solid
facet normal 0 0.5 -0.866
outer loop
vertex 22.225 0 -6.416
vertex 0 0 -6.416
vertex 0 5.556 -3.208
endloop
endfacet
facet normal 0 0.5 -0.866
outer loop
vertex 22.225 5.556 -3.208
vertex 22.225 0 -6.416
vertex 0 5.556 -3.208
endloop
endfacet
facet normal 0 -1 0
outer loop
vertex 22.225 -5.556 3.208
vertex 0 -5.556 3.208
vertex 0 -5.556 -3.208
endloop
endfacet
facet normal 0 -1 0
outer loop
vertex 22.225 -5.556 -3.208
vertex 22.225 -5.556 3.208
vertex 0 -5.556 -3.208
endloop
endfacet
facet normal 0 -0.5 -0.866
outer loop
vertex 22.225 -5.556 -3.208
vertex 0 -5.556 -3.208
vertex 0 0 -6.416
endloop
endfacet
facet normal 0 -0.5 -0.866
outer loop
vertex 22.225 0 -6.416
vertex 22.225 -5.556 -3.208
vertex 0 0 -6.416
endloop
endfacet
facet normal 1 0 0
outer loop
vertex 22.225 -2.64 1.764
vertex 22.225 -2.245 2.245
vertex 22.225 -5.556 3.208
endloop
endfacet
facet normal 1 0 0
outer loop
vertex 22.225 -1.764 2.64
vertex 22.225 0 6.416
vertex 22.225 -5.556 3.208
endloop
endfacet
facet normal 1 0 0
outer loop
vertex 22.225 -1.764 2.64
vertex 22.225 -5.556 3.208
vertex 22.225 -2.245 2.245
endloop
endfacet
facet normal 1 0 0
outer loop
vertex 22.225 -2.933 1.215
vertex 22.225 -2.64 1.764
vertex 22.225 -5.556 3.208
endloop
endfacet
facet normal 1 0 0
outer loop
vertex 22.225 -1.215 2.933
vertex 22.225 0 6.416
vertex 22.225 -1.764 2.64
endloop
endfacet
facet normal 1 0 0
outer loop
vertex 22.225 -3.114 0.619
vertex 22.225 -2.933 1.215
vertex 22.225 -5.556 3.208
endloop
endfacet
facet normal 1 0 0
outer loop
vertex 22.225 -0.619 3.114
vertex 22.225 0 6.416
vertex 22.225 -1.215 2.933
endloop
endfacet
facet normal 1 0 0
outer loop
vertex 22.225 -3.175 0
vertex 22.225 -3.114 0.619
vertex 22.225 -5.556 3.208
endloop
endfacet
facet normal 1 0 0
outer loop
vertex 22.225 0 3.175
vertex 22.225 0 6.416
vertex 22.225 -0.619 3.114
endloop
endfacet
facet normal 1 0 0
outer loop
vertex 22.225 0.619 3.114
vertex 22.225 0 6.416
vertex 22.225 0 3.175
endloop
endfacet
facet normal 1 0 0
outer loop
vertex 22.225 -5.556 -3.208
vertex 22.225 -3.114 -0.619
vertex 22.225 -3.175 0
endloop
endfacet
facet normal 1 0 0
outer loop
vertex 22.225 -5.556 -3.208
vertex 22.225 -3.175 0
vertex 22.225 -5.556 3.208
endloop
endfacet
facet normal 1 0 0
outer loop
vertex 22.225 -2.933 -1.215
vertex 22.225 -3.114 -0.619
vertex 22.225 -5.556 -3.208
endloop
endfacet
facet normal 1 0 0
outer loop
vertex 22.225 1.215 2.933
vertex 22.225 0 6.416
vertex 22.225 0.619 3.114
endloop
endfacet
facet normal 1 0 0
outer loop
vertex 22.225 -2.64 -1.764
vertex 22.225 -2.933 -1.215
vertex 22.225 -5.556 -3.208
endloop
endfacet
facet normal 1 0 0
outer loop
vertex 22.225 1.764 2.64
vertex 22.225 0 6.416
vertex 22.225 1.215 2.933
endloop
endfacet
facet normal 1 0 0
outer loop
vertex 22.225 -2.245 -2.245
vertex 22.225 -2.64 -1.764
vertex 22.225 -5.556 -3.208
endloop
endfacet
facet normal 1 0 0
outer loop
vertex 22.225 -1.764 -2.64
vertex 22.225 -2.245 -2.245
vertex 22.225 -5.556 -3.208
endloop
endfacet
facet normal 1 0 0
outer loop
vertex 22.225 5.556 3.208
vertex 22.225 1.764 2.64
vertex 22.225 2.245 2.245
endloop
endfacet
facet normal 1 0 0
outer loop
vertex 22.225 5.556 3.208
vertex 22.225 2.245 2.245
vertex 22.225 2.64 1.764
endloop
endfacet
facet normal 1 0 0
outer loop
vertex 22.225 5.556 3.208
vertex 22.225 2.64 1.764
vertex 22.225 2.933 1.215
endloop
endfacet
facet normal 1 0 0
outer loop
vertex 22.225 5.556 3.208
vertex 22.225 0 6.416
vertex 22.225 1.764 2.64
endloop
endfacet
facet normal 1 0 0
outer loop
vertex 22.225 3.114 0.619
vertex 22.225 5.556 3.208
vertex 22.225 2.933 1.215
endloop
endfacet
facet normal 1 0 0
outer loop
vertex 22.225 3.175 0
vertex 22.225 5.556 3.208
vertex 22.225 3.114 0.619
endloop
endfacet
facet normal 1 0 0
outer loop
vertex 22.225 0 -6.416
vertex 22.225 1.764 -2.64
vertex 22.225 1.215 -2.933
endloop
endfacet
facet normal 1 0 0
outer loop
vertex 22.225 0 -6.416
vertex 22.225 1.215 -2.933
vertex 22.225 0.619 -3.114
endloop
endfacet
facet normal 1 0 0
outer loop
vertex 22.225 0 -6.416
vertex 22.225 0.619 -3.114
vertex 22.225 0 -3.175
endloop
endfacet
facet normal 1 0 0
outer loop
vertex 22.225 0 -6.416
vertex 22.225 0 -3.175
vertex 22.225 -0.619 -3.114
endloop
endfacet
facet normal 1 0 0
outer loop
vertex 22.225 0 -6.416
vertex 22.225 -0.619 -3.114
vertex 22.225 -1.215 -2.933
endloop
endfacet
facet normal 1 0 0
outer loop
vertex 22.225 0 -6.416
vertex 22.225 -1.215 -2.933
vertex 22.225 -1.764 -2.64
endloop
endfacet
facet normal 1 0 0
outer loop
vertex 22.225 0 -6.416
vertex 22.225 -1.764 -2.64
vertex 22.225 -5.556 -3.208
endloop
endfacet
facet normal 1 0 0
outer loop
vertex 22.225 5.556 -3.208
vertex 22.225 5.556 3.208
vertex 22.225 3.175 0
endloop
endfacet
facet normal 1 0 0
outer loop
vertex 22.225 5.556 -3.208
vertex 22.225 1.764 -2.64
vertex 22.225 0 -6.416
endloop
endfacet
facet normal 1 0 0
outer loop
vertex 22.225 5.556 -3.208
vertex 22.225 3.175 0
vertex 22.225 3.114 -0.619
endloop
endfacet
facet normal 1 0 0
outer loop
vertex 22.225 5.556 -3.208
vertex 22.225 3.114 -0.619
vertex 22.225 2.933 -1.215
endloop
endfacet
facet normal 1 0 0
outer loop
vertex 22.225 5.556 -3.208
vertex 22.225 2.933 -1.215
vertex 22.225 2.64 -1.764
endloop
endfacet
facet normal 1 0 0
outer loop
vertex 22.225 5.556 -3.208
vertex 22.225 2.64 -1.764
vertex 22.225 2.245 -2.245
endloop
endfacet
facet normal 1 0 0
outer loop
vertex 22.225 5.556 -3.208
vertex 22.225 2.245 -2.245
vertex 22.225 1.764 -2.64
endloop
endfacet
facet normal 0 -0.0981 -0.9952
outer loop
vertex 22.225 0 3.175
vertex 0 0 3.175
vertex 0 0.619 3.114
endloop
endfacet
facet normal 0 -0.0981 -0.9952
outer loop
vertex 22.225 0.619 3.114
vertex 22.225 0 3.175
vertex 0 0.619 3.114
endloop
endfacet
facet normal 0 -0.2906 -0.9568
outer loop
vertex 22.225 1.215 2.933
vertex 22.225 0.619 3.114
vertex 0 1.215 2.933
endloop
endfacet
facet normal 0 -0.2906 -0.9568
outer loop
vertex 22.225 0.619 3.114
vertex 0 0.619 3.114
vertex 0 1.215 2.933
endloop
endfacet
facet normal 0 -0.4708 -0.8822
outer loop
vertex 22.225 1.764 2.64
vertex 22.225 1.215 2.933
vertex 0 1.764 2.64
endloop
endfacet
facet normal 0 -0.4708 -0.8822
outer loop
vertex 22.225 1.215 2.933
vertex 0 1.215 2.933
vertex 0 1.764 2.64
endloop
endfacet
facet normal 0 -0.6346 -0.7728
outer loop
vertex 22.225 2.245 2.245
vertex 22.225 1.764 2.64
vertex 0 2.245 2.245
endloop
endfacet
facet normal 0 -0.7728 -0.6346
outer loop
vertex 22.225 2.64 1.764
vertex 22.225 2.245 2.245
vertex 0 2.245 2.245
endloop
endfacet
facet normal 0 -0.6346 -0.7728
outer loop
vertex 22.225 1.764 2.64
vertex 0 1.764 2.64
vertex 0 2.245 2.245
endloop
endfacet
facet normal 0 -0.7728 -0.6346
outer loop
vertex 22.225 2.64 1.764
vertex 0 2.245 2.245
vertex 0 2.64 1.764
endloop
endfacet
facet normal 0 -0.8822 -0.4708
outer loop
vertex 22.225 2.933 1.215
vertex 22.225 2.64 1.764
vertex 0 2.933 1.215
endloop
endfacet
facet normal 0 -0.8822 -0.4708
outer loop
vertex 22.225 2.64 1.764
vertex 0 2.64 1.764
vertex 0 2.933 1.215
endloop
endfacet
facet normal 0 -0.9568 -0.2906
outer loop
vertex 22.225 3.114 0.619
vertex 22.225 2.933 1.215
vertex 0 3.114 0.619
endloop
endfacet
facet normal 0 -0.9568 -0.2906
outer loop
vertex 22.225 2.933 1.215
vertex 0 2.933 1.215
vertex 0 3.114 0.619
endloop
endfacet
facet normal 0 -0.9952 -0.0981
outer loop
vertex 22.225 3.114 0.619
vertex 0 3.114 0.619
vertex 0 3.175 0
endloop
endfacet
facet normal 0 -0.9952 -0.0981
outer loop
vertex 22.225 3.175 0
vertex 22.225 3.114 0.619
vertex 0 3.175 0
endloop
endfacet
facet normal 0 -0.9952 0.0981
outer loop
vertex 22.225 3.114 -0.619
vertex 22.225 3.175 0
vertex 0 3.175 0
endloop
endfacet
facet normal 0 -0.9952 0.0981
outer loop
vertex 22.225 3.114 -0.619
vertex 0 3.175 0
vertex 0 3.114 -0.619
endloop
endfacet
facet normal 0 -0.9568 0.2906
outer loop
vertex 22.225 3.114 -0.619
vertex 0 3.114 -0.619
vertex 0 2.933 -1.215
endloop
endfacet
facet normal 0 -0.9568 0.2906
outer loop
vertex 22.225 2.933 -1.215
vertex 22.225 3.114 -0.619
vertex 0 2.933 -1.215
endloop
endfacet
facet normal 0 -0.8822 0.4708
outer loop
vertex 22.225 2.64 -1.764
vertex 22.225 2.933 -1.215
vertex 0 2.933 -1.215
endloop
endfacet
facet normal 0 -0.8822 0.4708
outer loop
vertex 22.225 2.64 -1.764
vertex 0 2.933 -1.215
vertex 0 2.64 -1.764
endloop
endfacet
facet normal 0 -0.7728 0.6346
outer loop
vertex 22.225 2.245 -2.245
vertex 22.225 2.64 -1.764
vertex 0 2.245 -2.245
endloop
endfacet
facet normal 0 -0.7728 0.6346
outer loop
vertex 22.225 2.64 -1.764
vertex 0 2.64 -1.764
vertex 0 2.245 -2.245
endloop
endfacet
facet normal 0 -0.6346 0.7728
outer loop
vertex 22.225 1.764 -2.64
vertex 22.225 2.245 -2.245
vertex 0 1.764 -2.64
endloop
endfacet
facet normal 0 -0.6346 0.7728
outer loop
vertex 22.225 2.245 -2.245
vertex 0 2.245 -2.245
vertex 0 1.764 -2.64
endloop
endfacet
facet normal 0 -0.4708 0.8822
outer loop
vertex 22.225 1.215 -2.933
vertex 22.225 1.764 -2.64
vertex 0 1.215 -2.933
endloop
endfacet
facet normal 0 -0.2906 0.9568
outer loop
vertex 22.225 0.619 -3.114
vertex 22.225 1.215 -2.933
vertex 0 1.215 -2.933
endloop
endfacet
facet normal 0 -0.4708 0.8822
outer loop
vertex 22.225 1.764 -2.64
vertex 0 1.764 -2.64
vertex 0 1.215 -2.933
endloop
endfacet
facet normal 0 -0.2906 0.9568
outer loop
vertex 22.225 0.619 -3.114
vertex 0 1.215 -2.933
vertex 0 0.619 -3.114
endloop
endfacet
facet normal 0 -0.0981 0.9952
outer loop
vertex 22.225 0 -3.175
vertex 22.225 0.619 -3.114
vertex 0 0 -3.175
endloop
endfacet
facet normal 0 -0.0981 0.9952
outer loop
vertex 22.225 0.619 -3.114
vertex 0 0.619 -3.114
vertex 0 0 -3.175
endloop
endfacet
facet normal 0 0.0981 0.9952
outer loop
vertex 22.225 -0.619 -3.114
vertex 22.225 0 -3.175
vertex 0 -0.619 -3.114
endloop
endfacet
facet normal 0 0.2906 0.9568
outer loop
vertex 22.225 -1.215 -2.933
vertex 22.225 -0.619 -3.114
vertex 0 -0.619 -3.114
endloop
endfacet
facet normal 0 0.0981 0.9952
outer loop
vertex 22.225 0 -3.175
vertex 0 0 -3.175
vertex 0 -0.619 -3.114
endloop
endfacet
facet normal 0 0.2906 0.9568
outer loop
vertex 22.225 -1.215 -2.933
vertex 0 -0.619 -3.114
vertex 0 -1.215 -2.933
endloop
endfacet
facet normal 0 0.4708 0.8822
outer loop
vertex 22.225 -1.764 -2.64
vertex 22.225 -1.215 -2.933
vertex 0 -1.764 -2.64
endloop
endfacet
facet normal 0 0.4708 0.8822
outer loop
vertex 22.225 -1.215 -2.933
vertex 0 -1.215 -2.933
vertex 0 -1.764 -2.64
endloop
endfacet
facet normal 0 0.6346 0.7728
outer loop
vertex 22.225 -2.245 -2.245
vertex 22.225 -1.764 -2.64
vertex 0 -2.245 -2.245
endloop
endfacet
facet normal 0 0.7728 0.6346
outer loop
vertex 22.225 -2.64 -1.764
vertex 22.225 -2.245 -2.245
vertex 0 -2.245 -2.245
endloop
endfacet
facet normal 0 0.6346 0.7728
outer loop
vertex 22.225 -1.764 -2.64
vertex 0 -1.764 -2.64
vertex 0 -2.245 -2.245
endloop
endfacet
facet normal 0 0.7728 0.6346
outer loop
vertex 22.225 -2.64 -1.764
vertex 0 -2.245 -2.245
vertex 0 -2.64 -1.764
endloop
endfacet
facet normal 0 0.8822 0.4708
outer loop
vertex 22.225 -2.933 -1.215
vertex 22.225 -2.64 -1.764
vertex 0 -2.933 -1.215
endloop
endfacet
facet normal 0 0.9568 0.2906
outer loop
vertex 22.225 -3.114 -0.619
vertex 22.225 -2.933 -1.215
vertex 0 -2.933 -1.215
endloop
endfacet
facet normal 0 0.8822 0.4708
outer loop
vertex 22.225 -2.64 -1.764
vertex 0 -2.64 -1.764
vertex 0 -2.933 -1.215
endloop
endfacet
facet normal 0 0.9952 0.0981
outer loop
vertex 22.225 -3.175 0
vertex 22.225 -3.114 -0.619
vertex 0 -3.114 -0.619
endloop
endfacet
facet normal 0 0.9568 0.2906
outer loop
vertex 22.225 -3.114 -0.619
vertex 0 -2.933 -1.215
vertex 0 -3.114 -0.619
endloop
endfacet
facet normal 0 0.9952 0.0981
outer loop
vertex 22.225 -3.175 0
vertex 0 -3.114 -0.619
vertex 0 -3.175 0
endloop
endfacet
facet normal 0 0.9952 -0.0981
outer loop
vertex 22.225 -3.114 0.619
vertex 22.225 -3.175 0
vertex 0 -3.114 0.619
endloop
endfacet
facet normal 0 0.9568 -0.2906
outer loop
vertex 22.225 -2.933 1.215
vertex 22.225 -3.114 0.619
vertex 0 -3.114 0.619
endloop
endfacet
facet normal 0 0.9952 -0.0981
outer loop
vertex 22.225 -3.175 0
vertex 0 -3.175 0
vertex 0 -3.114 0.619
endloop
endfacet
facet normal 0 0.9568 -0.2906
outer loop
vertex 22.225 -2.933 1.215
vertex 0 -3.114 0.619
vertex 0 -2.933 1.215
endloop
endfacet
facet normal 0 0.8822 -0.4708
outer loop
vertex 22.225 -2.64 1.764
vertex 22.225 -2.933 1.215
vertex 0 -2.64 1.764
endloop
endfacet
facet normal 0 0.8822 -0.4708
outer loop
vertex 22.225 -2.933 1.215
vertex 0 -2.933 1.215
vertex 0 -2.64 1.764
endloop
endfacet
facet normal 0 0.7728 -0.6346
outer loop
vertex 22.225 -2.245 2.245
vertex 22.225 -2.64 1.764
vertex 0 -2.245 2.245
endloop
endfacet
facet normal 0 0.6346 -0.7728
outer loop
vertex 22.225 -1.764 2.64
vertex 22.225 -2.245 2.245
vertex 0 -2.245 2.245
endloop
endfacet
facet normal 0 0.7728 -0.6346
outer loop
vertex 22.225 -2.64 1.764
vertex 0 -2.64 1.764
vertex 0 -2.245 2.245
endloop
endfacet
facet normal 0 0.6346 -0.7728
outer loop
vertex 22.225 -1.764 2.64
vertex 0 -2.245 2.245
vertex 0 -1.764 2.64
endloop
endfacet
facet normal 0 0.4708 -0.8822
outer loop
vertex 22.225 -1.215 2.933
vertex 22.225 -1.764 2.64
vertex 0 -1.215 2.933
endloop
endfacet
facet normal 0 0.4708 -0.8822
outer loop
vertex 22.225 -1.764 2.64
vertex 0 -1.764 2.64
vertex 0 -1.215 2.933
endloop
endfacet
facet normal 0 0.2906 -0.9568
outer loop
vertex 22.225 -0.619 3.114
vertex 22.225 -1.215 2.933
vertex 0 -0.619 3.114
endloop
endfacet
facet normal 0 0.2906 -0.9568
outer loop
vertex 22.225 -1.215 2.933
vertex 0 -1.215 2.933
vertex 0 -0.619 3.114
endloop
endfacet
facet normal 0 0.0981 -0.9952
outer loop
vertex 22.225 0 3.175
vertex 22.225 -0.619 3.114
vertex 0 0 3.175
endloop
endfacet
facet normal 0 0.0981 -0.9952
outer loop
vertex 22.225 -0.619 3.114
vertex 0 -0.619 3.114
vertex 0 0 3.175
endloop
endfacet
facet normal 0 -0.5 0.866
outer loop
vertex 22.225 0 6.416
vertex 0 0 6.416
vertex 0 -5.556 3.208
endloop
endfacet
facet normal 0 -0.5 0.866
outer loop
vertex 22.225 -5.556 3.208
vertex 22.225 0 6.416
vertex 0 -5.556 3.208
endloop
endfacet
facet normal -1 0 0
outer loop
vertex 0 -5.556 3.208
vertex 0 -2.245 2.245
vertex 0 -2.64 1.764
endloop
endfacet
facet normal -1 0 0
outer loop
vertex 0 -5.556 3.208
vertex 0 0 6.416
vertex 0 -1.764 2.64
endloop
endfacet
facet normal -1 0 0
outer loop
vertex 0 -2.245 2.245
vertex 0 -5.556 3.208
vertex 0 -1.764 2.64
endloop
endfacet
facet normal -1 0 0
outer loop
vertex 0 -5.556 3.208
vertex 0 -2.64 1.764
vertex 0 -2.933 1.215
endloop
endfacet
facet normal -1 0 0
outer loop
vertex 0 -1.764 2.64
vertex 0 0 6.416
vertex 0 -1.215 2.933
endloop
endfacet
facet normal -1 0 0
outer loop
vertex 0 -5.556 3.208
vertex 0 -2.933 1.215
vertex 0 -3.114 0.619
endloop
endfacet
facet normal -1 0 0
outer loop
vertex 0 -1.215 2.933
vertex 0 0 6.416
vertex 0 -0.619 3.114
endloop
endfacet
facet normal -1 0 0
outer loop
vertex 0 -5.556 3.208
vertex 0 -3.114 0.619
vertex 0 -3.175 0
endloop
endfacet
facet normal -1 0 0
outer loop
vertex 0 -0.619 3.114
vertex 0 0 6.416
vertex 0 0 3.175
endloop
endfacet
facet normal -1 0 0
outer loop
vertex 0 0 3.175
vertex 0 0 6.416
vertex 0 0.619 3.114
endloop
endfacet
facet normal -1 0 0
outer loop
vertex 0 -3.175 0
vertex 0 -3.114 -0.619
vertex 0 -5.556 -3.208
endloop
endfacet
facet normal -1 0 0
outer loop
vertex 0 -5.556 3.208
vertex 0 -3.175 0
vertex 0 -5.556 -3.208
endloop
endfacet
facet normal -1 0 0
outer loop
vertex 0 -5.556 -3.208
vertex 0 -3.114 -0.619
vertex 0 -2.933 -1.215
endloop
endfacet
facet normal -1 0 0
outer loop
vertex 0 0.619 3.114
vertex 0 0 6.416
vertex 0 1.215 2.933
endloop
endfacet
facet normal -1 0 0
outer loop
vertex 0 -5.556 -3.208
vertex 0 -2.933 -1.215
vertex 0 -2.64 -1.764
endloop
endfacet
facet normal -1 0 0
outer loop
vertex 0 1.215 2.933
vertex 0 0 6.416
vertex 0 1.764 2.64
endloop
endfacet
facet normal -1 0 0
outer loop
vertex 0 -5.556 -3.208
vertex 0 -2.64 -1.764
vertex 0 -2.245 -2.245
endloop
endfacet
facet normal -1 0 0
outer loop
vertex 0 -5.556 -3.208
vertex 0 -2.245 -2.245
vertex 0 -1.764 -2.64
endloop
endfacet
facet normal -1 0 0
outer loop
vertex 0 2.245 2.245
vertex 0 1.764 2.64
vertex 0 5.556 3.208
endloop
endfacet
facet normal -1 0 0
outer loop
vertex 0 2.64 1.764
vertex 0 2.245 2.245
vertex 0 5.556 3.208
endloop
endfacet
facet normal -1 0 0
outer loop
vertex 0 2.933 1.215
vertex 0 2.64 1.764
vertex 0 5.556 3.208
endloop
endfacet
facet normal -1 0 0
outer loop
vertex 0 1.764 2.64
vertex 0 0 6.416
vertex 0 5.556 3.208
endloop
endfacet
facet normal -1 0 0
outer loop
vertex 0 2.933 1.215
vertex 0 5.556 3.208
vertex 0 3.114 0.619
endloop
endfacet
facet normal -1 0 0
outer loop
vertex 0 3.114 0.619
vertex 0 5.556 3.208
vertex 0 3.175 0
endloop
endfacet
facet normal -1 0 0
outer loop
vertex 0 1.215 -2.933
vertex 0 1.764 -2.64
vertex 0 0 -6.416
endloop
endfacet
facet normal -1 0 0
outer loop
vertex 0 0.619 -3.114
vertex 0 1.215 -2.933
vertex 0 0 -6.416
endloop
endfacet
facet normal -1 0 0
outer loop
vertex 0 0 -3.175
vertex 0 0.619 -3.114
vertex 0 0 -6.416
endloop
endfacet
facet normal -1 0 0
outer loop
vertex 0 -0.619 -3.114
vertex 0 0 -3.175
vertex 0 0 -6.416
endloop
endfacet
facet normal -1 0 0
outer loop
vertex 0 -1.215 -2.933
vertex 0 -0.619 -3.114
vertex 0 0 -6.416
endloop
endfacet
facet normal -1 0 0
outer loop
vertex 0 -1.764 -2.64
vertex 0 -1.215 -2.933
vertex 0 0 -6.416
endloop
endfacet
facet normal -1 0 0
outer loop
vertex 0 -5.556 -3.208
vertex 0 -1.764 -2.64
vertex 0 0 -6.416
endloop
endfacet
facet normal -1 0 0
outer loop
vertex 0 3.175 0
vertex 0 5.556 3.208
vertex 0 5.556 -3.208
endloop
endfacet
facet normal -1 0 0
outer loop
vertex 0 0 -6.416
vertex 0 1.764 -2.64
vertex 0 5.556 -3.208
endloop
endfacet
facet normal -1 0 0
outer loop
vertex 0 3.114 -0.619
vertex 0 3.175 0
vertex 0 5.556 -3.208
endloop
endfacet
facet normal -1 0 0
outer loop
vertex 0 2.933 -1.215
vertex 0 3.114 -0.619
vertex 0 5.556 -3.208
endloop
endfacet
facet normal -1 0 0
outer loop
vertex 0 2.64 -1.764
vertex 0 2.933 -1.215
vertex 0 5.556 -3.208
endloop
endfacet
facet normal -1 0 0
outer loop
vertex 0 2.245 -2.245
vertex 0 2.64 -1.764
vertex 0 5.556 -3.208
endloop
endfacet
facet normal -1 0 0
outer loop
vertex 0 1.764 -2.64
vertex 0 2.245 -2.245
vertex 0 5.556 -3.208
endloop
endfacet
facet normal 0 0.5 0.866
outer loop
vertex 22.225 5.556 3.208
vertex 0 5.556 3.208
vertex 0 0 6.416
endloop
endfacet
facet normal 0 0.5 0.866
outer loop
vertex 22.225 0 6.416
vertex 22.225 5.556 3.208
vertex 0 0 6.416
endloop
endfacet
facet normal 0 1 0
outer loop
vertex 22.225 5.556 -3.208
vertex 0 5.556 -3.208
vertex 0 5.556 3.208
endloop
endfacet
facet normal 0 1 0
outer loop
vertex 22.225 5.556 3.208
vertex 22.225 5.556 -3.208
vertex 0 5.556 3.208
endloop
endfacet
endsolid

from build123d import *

# Parameters (mm, degrees)
BOSS_EXTRUDE1_DEPTH = 22.225
SKETCH2_R           = 3.175
CUT_EXTRUDE1_DEPTH  = 22.225


with BuildPart() as part:
    # Sketch1 → Boss-Extrude1 (new body)
    with BuildSketch(Plane(origin=(0, 0, 0), x_dir=(0, 0, -1), z_dir=(1, 0, 0))):
        Polygon((0, -5.55625), (0, 5.55625), (-3.207902433, 5.55625), (-6.415804866, 0), (-3.207902433, -5.55625), align=None)
        Polygon((3.207902433, 5.55625), (0, 5.55625), (0, -5.55625), (3.207902433, -5.55625), (6.415804866, 0), align=None)
    extrude(amount=BOSS_EXTRUDE1_DEPTH)

    # Sketch2 → Cut-Extrude1 (cut)
    with BuildSketch(Plane.ZY):
        Circle(SKETCH2_R)
    extrude(amount=-CUT_EXTRUDE1_DEPTH, mode=Mode.SUBTRACT)


solid = part.part
